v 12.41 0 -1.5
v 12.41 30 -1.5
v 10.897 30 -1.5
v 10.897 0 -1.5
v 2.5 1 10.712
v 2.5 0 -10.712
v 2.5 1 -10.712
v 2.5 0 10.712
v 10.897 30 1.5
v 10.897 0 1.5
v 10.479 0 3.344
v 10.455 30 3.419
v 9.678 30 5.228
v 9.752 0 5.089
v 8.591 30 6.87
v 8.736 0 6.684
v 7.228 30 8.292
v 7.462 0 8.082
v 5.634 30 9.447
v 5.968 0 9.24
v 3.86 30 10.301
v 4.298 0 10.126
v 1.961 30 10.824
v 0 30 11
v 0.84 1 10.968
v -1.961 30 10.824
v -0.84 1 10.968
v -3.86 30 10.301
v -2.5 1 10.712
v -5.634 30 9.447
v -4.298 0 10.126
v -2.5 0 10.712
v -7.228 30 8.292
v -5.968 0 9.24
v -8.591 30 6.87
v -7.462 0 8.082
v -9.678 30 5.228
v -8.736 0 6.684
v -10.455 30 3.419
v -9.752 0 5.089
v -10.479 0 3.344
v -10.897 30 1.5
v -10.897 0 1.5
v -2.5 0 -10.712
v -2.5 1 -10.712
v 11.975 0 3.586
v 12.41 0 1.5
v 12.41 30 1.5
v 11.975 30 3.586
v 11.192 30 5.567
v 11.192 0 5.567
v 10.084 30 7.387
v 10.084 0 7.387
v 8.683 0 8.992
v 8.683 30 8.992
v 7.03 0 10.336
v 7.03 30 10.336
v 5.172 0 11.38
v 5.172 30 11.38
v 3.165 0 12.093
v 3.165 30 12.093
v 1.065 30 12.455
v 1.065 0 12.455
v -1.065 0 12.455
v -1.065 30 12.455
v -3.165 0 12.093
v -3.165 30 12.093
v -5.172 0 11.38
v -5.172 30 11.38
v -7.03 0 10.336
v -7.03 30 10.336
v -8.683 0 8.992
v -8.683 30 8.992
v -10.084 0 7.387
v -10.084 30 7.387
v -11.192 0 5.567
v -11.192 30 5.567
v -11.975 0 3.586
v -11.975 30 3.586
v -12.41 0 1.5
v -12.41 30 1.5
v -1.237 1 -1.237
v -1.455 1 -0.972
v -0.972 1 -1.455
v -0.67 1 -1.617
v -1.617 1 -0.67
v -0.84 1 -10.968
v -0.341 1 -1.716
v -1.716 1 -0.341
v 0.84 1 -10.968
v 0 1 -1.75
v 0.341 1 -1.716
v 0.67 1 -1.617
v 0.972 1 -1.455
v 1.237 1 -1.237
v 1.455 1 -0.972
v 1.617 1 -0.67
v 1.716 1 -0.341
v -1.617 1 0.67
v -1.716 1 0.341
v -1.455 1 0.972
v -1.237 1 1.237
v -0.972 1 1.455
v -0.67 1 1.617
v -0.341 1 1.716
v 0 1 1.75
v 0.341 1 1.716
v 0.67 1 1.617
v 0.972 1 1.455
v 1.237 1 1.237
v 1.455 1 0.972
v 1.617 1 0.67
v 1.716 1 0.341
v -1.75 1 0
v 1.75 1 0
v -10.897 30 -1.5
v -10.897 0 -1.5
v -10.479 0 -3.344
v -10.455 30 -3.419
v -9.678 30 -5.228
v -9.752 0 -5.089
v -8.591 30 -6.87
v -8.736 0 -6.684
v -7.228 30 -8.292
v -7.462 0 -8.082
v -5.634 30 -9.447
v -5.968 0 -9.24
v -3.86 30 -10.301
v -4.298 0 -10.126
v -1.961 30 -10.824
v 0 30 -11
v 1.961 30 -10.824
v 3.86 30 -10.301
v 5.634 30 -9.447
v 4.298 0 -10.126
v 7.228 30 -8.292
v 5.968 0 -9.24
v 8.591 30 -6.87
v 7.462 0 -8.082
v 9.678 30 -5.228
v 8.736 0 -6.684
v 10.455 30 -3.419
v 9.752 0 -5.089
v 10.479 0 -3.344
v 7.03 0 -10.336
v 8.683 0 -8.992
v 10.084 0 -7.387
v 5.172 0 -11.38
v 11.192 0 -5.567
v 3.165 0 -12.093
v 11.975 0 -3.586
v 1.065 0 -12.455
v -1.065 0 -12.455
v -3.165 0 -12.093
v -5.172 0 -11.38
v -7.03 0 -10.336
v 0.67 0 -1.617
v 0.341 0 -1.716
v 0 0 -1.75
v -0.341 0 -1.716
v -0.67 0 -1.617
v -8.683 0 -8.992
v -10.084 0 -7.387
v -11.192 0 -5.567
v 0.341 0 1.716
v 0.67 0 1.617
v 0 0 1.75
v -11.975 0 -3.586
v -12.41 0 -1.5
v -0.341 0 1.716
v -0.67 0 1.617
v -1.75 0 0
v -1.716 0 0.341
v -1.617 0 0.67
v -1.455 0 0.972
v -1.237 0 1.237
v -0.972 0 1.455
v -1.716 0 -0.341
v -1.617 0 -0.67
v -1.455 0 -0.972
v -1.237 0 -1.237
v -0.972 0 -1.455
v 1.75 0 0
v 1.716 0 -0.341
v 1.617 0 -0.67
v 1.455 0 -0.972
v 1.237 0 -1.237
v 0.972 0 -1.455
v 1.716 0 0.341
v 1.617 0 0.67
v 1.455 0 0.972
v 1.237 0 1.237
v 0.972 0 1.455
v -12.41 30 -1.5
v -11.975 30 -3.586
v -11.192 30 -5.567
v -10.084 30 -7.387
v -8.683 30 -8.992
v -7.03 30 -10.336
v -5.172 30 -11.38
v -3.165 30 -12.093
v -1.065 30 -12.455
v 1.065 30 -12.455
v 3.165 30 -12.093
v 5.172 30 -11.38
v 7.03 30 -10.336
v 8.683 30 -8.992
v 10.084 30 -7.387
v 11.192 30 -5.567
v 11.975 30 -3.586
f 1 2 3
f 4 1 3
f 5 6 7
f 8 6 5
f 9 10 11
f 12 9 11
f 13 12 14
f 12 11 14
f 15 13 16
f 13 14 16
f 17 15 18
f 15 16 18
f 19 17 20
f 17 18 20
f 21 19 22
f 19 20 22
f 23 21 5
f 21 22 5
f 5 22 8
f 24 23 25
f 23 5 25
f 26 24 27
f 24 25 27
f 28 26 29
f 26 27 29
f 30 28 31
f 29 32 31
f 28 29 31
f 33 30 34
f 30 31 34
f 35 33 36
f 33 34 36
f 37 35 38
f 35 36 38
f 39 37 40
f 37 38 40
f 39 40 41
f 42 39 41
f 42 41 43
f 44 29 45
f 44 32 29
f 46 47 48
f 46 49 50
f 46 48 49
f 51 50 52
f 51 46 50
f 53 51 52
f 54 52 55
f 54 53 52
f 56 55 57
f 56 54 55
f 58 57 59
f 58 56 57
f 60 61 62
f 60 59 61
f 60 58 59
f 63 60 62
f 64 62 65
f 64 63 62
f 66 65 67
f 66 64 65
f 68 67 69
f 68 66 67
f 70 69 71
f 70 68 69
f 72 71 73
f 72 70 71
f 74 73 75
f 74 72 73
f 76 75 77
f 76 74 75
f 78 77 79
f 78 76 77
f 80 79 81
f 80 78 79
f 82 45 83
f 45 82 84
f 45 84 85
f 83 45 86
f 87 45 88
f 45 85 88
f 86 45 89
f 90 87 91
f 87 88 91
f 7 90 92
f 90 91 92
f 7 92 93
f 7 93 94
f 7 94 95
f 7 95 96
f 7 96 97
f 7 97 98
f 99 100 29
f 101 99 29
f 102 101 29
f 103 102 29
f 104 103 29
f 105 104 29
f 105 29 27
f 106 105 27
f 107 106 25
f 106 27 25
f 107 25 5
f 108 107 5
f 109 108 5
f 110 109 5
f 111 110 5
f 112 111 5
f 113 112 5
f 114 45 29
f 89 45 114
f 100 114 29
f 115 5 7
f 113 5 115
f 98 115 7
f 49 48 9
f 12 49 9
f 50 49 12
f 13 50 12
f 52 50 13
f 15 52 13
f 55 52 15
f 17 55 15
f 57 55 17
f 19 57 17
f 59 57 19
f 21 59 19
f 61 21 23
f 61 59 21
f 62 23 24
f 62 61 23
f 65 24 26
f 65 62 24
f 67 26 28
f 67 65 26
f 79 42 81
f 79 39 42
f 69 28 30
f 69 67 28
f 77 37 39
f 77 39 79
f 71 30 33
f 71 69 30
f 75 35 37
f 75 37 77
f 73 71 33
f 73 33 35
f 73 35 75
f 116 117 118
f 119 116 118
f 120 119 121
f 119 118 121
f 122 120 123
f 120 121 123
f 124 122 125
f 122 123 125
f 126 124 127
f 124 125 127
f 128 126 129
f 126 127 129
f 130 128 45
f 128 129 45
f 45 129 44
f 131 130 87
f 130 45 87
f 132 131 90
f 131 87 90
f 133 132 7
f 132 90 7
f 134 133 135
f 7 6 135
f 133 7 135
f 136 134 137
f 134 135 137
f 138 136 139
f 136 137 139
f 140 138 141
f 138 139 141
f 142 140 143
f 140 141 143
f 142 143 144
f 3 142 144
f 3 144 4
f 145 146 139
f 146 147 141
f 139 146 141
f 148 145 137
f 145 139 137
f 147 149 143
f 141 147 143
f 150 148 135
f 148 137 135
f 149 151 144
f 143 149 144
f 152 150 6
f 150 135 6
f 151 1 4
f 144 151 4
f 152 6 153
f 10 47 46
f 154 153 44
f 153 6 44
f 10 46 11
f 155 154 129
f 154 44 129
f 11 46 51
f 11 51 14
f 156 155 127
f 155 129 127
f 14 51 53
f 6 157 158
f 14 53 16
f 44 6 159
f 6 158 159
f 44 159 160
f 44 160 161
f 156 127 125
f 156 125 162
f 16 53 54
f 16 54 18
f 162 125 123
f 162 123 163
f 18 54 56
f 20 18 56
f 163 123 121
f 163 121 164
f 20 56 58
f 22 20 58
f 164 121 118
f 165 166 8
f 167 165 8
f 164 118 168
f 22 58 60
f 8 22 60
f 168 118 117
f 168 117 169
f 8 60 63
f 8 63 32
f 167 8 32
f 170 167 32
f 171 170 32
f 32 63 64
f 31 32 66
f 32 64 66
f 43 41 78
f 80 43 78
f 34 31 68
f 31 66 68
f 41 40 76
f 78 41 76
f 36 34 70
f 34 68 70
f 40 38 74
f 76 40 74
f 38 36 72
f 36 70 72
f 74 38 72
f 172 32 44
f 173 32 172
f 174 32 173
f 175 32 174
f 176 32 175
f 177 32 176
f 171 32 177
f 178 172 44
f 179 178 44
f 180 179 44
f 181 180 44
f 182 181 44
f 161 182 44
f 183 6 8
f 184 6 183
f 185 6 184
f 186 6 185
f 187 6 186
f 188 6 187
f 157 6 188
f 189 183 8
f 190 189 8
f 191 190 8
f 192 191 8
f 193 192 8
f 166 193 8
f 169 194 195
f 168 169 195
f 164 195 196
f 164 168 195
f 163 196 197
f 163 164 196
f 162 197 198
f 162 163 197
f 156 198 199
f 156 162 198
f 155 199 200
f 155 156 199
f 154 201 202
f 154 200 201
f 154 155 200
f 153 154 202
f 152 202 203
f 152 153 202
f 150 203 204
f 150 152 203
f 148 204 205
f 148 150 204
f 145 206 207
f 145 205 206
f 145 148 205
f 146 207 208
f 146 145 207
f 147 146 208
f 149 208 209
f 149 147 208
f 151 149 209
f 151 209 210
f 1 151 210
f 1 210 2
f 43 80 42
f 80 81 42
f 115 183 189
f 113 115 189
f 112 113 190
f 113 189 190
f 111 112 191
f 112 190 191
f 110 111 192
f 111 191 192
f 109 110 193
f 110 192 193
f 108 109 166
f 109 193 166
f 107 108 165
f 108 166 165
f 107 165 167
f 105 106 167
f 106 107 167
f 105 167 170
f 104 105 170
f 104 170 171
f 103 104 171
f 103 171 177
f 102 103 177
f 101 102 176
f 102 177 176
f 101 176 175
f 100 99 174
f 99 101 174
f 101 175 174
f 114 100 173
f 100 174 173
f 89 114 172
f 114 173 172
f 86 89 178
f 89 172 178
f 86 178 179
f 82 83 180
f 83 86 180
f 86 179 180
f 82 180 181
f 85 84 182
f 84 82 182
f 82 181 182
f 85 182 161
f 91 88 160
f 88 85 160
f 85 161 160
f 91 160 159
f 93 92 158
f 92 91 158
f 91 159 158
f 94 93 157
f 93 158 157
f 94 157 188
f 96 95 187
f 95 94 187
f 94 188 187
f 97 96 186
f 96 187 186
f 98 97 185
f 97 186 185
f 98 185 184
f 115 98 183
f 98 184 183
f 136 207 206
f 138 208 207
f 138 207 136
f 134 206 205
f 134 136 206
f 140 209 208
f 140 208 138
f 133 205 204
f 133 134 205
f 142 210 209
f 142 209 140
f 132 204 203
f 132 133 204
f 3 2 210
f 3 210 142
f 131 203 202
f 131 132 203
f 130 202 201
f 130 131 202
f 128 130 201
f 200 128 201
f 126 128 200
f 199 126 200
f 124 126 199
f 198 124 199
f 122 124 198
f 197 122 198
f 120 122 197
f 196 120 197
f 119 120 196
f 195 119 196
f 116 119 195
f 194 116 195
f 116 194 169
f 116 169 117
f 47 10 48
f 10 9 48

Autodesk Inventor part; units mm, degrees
ref_plane "YZ Plane" through (0, 0, 0) normal (1, 0, 0) x (0, 1, 0)
ref_plane "XZ Plane" through (0, 0, 0) normal (0, 1, 0) x (-1, 0, 0)
ref_plane "XY Plane" through (0, 0, 0) normal (0, 0, 1) x (1, 0, 0)
sketch "Skizze1" plane through (0, 0, 0) normal (0, 1, 0) x (-1, 0, 0)
  circle A0 centre (0, 0) radius 12.5
  circle A1 centre (0, 0) radius 11
  dimension "d0" = 25
  dimension "d1" = 22
extrude "Extrusion1" add sketch "Skizze1" along normal blind 30
sketch "Skizze2" plane through (0, 0, 0) normal (0, -1, 0) x (1, 0, 0)
  circle A0 centre (0, 0) radius 1.75
  line L0 (0, 0) -> (0, 3.5)
  line L1 (0, 3.5) -> (2.5, 3.5)
  line L2 (2.5, 3.5) -> (-2.5, 3.5)
  line L3 (-2.5, 3.5) -> (-2.5, -11.5)
  line L4 (-2.5, -11.5) -> (2.5, -11.5)
  line L5 (2.5, -11.5) -> (2.5, 3.5)
  line L6 (2.5, 3.5) -> (-2.5, 3.5)
  line L7 (-2.5, 3.5) -> (-2.5, 11.3675)
  line L8 (-2.5, 11.3675) -> (2.5, 11.3675)
  line L9 (2.5, 11.3675) -> (2.5, 3.5)
  dimension "d7" = 3.5
  dimension "d8" = 3.5
  dimension "d9" = 2.5
  dimension "d10" = 5
  dimension "d11" = 15
extrude "Extrusion2" add sketch "Skizze2" against normal blind 1
sketch "Skizze3" plane through (0, 30, 0) normal (0, 1, 0) x (1, 0, 0)
  line L0 (-17.8957, 0) -> (-17.8957, -1.5)
  line L1 (-17.8957, -1.5) -> (13.7177, -1.5)
  line L2 (13.7177, -1.5) -> (13.7177, 1.5)
  line L3 (13.7177, 1.5) -> (-17.8957, 1.5)
  line L4 (-17.8957, 1.5) -> (-17.8957, -1.5)
  point P0 (0, 0)
  dimension "d14" = 1.5
  dimension "d15" = 3
extrude "Extrusion3" cut sketch "Skizze3" against normal up to surface (29 mm away)
sketch "Skizze4" plane through (-12.4097, 1, -1.5) normal (0, 1, 0) x (1, 0, 0)
  line L0 (0, 0) -> (1.5124, 0) projected
  line L1 (0, 0) -> (-0.8042, 0)
  line L2 (-0.8042, 0) -> (2.2509, 0)
  line L3 (2.2509, 0) -> (2.2509, -3)
  line L4 (2.2509, -3) -> (-0.8042, -3)
  line L5 (-0.8042, -3) -> (-0.8042, 0)
  point P0 (12.4097, -1.5)
  dimension "d18" = 3
extrude "Extrusion4" cut sketch "Skizze4" against normal through all
sketch "Skizze5" plane through (10.8972, 1, 1.5) normal (0, 1, 0) x (1, 0, 0)
  line L0 (0, 0) -> (1.5124, 0) projected
  line L1 (0, 0) -> (2.0703, 0)
  line L2 (2.0703, 0) -> (2.0703, 3)
  line L3 (2.0703, 3) -> (0, 3)
  line L4 (0, 3) -> (0, 0)
  point P0 (-10.8972, 1.5)
  dimension "d24" = 3
extrude "Extrusion5" cut sketch "Skizze5" against normal blind 10
properties part number "CatcherModel"
